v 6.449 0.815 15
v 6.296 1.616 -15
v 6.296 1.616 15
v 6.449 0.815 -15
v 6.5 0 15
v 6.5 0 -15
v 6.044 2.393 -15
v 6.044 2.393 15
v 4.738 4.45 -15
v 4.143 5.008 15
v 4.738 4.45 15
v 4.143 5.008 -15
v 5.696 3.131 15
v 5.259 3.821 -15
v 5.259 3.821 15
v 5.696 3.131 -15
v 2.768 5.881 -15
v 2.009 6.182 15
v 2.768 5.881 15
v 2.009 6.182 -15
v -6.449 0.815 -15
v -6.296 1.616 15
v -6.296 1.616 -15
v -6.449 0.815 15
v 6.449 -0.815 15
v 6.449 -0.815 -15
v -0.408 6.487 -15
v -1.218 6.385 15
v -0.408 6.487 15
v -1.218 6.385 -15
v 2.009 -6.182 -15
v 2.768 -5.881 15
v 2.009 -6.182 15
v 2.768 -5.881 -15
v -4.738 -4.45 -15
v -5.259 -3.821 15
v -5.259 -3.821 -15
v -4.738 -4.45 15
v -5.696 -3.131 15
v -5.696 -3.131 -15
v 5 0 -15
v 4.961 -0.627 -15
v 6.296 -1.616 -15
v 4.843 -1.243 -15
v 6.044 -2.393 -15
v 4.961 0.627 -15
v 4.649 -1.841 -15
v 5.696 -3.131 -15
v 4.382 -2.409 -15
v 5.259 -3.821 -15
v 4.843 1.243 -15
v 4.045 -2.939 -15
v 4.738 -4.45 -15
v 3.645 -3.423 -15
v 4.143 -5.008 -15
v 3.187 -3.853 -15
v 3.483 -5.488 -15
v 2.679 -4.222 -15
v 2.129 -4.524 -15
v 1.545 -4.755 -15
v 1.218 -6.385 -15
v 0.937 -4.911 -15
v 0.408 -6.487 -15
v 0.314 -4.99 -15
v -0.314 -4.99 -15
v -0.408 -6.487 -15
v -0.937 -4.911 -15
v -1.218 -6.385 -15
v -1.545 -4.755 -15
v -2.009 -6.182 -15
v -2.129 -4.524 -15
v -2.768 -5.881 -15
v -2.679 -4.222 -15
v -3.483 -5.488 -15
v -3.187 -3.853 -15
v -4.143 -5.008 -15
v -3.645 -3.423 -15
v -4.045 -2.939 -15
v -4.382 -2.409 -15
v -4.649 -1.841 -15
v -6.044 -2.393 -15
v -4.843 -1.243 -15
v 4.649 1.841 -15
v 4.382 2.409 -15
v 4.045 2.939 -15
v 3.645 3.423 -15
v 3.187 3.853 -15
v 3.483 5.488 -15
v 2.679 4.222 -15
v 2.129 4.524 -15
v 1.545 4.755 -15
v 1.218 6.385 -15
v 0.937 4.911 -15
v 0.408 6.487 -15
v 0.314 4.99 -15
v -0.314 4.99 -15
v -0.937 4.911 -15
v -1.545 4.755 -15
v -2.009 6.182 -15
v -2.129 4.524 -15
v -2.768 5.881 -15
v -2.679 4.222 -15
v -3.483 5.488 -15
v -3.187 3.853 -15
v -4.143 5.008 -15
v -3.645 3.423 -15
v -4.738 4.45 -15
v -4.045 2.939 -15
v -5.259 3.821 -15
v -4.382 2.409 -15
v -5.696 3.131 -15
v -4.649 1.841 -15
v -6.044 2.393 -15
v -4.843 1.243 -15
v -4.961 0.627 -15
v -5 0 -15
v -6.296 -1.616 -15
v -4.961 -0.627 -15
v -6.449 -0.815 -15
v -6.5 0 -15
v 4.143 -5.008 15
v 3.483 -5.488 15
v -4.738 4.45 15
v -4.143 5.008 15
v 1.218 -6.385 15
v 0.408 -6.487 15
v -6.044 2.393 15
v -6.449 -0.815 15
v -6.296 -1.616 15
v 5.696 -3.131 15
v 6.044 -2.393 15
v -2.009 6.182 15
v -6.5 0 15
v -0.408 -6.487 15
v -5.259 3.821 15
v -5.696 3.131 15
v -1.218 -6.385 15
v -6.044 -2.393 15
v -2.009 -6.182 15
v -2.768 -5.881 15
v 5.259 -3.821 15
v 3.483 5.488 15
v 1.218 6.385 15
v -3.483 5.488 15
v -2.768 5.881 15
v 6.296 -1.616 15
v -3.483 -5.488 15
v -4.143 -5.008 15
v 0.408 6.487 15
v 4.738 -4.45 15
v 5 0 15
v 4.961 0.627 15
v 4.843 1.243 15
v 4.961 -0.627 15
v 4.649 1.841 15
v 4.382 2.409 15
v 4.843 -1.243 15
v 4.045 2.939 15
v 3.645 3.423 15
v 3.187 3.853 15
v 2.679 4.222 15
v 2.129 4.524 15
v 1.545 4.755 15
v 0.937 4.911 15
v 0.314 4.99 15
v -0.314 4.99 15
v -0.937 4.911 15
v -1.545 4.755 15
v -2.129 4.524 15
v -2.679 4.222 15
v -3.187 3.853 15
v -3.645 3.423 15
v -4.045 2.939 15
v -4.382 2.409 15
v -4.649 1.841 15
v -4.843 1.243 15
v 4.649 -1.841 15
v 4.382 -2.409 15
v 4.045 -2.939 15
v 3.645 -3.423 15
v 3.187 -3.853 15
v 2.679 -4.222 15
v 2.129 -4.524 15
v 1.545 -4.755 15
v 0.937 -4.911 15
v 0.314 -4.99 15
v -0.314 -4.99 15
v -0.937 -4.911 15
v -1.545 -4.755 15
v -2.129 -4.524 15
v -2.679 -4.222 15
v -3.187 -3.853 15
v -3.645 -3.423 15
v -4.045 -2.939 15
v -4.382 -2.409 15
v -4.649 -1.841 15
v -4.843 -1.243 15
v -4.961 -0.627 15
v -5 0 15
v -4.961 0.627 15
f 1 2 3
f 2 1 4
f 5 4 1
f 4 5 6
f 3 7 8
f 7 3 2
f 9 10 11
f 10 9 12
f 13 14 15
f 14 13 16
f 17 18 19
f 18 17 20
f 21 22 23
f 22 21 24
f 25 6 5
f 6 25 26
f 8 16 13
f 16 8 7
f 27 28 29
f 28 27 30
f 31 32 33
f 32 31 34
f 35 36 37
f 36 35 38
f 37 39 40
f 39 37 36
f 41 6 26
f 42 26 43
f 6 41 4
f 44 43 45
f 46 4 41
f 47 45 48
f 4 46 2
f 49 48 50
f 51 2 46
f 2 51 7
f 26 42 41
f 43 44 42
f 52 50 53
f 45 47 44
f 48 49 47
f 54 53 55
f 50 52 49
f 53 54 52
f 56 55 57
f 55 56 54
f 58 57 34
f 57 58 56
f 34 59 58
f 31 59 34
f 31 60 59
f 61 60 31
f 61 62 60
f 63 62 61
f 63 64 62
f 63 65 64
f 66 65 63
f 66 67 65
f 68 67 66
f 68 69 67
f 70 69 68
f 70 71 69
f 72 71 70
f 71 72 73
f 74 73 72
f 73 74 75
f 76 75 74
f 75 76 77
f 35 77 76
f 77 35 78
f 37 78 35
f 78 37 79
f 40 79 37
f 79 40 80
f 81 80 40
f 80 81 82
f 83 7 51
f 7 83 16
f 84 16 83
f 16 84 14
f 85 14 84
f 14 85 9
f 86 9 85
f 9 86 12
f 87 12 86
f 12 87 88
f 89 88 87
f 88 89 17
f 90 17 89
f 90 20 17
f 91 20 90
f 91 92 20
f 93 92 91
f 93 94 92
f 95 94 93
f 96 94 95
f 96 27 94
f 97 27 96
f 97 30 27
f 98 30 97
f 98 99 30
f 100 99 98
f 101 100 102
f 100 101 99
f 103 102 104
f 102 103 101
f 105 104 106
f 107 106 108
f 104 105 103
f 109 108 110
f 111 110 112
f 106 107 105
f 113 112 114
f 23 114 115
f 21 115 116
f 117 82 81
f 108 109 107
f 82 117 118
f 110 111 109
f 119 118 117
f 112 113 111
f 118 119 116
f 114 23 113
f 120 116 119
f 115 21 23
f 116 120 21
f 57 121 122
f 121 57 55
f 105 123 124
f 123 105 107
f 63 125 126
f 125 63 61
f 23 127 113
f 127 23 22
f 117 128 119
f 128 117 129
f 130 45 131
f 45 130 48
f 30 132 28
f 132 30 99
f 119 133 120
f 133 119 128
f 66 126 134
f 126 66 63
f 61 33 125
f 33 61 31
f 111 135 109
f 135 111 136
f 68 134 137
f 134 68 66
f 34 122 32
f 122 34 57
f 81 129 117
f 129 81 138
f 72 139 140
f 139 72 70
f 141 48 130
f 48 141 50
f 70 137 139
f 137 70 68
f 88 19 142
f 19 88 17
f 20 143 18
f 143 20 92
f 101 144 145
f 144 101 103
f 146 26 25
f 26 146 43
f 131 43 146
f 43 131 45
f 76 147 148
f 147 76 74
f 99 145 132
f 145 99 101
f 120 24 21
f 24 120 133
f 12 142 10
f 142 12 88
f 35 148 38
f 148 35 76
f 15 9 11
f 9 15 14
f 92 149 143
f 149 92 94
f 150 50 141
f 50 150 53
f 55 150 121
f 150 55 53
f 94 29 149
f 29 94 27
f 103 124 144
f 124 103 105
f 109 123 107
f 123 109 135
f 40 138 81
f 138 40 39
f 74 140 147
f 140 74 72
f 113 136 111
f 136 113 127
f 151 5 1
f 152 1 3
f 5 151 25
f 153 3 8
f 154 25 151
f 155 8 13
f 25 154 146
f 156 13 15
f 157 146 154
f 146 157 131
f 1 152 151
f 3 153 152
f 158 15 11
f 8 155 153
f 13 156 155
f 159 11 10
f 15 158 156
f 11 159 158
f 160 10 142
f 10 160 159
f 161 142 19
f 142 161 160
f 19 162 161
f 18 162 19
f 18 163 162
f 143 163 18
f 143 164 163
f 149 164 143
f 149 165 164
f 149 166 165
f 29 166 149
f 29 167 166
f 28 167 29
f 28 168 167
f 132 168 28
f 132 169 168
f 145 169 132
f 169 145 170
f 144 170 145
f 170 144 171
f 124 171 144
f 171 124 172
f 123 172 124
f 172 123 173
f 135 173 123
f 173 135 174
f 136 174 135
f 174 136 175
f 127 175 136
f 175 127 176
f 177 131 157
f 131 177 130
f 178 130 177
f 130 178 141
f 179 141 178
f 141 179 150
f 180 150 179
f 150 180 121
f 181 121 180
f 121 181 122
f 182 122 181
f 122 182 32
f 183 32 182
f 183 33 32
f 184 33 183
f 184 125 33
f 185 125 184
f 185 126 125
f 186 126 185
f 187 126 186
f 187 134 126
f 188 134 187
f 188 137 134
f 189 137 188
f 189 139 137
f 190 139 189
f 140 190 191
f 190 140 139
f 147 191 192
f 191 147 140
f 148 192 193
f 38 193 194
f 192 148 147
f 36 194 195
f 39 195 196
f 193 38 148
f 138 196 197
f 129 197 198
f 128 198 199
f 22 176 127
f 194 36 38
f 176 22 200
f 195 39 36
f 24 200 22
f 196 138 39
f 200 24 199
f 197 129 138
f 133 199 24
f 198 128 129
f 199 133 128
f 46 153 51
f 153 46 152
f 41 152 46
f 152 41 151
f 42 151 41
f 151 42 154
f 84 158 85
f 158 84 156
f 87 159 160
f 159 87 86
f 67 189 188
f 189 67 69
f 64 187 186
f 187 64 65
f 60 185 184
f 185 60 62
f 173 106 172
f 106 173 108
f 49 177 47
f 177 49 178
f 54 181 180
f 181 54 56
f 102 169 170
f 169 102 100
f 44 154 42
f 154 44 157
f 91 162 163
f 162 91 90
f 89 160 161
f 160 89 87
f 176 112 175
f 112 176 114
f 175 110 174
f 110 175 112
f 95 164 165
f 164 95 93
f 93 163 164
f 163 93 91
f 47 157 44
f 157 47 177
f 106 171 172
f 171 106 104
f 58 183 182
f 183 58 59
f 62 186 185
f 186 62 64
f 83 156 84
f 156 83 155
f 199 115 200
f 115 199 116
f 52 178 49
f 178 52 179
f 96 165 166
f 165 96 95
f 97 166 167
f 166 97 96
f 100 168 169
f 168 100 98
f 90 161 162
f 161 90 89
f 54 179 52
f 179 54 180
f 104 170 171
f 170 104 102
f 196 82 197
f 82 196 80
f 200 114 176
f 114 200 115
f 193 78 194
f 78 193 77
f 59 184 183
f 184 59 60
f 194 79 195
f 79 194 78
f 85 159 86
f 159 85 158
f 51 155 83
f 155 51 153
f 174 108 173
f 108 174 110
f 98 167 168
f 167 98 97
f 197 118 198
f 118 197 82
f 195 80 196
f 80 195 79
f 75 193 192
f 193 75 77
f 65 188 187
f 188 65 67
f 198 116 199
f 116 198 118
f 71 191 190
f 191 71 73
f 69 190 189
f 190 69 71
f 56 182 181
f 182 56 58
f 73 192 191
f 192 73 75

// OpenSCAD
$fn = 50;


difference() {
	union() {
		translate(v = [0, 0, -15.0000000000]) {
			cylinder(h = 30, r = 6.5000000000);
		}
	}
	union() {
		translate(v = [0, 0, -100.0000000000]) {
			cylinder(h = 200, r = 5.0000000000);
		}
	}
}
